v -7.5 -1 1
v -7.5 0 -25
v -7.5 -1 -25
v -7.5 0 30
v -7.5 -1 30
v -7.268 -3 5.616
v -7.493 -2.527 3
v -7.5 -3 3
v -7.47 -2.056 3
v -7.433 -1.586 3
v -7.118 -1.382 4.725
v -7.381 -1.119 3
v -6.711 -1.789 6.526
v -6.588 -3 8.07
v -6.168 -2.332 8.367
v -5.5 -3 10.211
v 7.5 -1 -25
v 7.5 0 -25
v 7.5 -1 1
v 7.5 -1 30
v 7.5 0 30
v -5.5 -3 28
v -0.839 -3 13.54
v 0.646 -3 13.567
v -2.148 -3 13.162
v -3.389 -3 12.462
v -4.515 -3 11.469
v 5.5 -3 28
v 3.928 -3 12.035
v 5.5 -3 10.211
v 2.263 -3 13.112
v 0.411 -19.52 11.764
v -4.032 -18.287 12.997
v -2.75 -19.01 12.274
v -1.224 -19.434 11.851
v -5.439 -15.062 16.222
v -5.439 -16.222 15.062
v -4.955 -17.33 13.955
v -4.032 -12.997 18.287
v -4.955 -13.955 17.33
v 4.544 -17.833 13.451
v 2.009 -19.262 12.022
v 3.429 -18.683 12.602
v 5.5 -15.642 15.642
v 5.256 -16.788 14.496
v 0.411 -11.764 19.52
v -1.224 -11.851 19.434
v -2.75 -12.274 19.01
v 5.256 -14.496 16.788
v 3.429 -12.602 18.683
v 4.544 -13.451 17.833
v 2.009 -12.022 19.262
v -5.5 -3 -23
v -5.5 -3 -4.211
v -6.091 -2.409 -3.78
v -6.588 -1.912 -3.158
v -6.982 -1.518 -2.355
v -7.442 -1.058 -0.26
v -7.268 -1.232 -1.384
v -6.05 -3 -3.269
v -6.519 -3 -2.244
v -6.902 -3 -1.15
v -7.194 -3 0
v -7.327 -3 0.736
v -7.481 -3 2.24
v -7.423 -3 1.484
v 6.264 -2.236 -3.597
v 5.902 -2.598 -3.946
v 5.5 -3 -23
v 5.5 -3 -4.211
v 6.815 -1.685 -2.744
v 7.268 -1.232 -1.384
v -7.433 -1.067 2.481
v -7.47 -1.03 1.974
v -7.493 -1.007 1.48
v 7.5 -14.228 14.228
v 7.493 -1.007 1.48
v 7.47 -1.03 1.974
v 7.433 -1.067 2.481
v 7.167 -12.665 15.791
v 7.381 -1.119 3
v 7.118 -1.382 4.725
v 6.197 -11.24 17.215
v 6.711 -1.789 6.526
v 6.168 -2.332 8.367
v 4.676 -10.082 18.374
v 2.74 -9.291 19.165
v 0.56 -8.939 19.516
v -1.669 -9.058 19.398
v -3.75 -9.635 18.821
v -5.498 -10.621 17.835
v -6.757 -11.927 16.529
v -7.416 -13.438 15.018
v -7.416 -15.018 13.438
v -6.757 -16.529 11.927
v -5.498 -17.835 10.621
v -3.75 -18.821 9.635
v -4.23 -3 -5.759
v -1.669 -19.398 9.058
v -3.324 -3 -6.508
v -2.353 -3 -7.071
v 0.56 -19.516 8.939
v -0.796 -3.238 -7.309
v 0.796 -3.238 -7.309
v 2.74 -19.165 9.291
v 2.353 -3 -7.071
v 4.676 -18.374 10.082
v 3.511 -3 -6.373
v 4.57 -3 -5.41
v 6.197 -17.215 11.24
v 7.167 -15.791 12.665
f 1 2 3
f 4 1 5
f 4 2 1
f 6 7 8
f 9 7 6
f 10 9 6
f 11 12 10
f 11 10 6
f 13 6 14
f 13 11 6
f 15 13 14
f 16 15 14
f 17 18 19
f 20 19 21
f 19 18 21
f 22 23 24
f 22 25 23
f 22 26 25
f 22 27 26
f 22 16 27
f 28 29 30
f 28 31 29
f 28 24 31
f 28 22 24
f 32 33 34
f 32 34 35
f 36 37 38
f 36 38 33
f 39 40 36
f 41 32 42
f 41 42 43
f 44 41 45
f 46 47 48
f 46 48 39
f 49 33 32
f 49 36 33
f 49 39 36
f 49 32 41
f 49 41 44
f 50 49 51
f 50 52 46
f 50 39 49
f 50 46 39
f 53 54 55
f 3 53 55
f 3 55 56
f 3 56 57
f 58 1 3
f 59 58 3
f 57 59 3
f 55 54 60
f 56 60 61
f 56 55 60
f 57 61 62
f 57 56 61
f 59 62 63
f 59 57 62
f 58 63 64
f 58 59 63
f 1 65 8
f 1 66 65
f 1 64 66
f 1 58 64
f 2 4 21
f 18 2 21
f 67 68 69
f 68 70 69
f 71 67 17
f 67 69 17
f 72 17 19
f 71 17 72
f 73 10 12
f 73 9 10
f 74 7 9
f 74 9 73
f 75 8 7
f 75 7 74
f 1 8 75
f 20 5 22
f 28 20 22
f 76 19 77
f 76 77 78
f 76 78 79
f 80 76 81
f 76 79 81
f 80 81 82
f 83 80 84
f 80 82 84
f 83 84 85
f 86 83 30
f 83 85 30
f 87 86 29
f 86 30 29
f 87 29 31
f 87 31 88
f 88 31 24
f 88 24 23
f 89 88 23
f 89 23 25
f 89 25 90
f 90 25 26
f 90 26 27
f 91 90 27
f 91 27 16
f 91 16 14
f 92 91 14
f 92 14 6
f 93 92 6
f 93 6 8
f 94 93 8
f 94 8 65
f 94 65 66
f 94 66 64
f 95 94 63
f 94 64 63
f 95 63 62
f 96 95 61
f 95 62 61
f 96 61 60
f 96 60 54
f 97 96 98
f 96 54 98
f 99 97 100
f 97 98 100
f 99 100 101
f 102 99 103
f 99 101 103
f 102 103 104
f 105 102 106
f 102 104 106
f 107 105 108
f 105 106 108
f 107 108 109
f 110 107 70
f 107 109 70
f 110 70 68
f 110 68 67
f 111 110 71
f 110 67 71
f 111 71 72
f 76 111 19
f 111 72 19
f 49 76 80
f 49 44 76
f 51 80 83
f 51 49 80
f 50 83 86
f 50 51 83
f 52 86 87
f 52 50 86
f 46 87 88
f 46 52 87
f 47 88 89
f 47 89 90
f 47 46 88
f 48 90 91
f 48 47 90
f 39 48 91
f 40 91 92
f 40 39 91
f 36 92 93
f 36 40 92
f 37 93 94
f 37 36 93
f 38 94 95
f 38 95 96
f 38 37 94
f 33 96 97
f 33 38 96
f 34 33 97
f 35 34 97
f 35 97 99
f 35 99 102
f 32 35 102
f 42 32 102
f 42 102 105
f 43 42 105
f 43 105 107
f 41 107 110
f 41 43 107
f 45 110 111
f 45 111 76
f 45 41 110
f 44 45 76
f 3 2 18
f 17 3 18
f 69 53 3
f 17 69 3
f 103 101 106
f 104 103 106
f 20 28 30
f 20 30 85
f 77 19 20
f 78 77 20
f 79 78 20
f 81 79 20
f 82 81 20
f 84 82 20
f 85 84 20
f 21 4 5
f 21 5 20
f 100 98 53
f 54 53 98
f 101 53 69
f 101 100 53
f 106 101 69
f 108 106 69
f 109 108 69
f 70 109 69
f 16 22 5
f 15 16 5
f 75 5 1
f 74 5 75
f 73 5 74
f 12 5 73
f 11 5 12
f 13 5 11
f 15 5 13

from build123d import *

# Parameters (mm, degrees)
F0_W          = 15
F0_H          = 55
F1_DEPTH      = 3
F4_R          = 7.5
F5_DEPTH      = 20
F5_DEPTH_BACK = 5
F6_T1_DEPTH   = 25.2867319519
F6_T6_DEPTH   = 32.1433659759
F6_S7_R       = 7.5
F6_T8_DEPTH   = 18
F6_T14_DEPTH  = 32.1433659759
F6_S15_R      = 7.5
F6_T16_DEPTH  = 18
F6_T20_DEPTH  = 33.1433659759
F6_S21_R      = 7.5
F6_T22_DEPTH  = 18
F6_T26_DEPTH  = 33.1433659759
F6_S27_R      = 7.5
F6_T28_DEPTH  = 18
F7_DEPTH      = 25


# Not quite as in the source:
# - a fillet or chamfer that OpenCascade refuses, or shapes differently, is made with other operations: its cross-section is extruded or revolved along the edge and cut away or added


with BuildPart() as f1:
    # F0 (on Front) → F1 (new body)
    with BuildSketch(Plane.XZ):
        with Locations((0, 2.5)):
            Rectangle(F0_W, F0_H)
    extrude(amount=F1_DEPTH)

    # F4 (on face) → F5 (join, two sides)
    with BuildSketch(Plane(origin=(0, -1.5, 1.5), x_dir=(1, 0, 0), z_dir=(0, -0.7071067812, 0.7071067812))) as f5_sk:
        Circle(F4_R)
    extrude(amount=F5_DEPTH)
    extrude(f5_sk.sketch, amount=-F5_DEPTH_BACK)

    # F6: chamfer of 2 on 7 edges, made by hand

    # F6_s2 → F6_t1 (cut)
    with BuildSketch(Plane.YZ.offset(-12.6433659759)):
        Polygon((-1, 30), (-3, 28), (-3, 30), align=None)
        Polygon((-3, -23), (-1, -25), (-3, -25), align=None)
    extrude(amount=F6_T1_DEPTH, mode=Mode.SUBTRACT)


with BuildPart() as f6_tool4:
    # F6_s5 → F6_t6 (new body)
    with BuildSketch(Plane.XY.offset(35.1433659759)):
        Polygon((-5.5, -3), (-7.5, -1), (-7.5, -3), align=None)
    extrude(amount=-F6_T6_DEPTH)

    # F6_s7 → F6_t8 (cut, symmetric)
    with BuildSketch(Plane(origin=(0, -10.5358910397, 10.5358910397), x_dir=(1, 0, 0), z_dir=(0, 0.7071067812, -0.7071067812))):
        Circle(F6_S7_R)
    extrude(amount=F6_T8_DEPTH, both=True, mode=Mode.SUBTRACT)


with BuildPart() as f1_1:
    add(f1.part)

    # F6_t3: cut F6_tool4
    add(f6_tool4.part, mode=Mode.SUBTRACT)

    # F6_s9 → F6_t10 (revolve, cut)
    with BuildSketch(Plane(origin=(0, 0, 0), x_dir=(1, 0, 0), z_dir=(0, -0.7071067812, -0.7071067812))):
        Polygon((7.5, 20.1213203436), (5.5, 22.1213203436), (7.5, 22.1213203436), align=None)
    revolve(axis=Axis((0, -15.6421356237, 15.6421356237), (0, -0.7071067812, 0.7071067812)), mode=Mode.SUBTRACT)


with BuildPart() as f6_tool12:
    # F6_s13 → F6_t14 (new body)
    with BuildSketch(Plane.XY.offset(3)):
        Polygon((5.5, -3), (7.5, -1), (7.5, -3), align=None)
    extrude(amount=F6_T14_DEPTH)

    # F6_s15 → F6_t16 (cut, symmetric)
    with BuildSketch(Plane(origin=(0, -10.5358910397, 10.5358910397), x_dir=(1, 0, 0), z_dir=(0, 0.7071067812, -0.7071067812))):
        Circle(F6_S15_R)
    extrude(amount=F6_T16_DEPTH, both=True, mode=Mode.SUBTRACT)


with BuildPart() as f1_2:
    add(f1_1.part)

    # F6_t11: cut F6_tool12
    add(f6_tool12.part, mode=Mode.SUBTRACT)


with BuildPart() as f6_tool18:
    # F6_s19 → F6_t20 (new body)
    with BuildSketch(Plane.XY.offset(-30.1433659759)):
        Polygon((5.5, -3), (7.5, -1), (7.5, -3), align=None)
    extrude(amount=F6_T20_DEPTH)

    # F6_s21 → F6_t22 (cut, symmetric)
    with BuildSketch(Plane(origin=(0, 5.7982756057, -5.7982756057), x_dir=(1, 0, 0), z_dir=(0, 0.7071067812, -0.7071067812))):
        Circle(F6_S21_R)
    extrude(amount=F6_T22_DEPTH, both=True, mode=Mode.SUBTRACT)


with BuildPart() as f1_3:
    add(f1_2.part)

    # F6_t17: cut F6_tool18
    add(f6_tool18.part, mode=Mode.SUBTRACT)


with BuildPart() as f6_tool24:
    # F6_s25 → F6_t26 (new body)
    with BuildSketch(Plane.XY.offset(3)):
        Polygon((-5.5, -3), (-7.5, -1), (-7.5, -3), align=None)
    extrude(amount=-F6_T26_DEPTH)

    # F6_s27 → F6_t28 (cut, symmetric)
    with BuildSketch(Plane(origin=(0, 5.7982756057, -5.7982756057), x_dir=(1, 0, 0), z_dir=(0, 0.7071067812, -0.7071067812))):
        Circle(F6_S27_R)
    extrude(amount=F6_T28_DEPTH, both=True, mode=Mode.SUBTRACT)


with BuildPart() as f1_4:
    add(f1_3.part)

    # F6_t23: cut F6_tool24
    add(f6_tool24.part, mode=Mode.SUBTRACT)

    # F0 (on Front) → F7 (cut)
    with BuildSketch(Plane.XZ):
        with Locations((0, 2.5)):
            Rectangle(F0_W, F0_H)
    extrude(amount=-F7_DEPTH, mode=Mode.SUBTRACT)


solid = f1_4.part
